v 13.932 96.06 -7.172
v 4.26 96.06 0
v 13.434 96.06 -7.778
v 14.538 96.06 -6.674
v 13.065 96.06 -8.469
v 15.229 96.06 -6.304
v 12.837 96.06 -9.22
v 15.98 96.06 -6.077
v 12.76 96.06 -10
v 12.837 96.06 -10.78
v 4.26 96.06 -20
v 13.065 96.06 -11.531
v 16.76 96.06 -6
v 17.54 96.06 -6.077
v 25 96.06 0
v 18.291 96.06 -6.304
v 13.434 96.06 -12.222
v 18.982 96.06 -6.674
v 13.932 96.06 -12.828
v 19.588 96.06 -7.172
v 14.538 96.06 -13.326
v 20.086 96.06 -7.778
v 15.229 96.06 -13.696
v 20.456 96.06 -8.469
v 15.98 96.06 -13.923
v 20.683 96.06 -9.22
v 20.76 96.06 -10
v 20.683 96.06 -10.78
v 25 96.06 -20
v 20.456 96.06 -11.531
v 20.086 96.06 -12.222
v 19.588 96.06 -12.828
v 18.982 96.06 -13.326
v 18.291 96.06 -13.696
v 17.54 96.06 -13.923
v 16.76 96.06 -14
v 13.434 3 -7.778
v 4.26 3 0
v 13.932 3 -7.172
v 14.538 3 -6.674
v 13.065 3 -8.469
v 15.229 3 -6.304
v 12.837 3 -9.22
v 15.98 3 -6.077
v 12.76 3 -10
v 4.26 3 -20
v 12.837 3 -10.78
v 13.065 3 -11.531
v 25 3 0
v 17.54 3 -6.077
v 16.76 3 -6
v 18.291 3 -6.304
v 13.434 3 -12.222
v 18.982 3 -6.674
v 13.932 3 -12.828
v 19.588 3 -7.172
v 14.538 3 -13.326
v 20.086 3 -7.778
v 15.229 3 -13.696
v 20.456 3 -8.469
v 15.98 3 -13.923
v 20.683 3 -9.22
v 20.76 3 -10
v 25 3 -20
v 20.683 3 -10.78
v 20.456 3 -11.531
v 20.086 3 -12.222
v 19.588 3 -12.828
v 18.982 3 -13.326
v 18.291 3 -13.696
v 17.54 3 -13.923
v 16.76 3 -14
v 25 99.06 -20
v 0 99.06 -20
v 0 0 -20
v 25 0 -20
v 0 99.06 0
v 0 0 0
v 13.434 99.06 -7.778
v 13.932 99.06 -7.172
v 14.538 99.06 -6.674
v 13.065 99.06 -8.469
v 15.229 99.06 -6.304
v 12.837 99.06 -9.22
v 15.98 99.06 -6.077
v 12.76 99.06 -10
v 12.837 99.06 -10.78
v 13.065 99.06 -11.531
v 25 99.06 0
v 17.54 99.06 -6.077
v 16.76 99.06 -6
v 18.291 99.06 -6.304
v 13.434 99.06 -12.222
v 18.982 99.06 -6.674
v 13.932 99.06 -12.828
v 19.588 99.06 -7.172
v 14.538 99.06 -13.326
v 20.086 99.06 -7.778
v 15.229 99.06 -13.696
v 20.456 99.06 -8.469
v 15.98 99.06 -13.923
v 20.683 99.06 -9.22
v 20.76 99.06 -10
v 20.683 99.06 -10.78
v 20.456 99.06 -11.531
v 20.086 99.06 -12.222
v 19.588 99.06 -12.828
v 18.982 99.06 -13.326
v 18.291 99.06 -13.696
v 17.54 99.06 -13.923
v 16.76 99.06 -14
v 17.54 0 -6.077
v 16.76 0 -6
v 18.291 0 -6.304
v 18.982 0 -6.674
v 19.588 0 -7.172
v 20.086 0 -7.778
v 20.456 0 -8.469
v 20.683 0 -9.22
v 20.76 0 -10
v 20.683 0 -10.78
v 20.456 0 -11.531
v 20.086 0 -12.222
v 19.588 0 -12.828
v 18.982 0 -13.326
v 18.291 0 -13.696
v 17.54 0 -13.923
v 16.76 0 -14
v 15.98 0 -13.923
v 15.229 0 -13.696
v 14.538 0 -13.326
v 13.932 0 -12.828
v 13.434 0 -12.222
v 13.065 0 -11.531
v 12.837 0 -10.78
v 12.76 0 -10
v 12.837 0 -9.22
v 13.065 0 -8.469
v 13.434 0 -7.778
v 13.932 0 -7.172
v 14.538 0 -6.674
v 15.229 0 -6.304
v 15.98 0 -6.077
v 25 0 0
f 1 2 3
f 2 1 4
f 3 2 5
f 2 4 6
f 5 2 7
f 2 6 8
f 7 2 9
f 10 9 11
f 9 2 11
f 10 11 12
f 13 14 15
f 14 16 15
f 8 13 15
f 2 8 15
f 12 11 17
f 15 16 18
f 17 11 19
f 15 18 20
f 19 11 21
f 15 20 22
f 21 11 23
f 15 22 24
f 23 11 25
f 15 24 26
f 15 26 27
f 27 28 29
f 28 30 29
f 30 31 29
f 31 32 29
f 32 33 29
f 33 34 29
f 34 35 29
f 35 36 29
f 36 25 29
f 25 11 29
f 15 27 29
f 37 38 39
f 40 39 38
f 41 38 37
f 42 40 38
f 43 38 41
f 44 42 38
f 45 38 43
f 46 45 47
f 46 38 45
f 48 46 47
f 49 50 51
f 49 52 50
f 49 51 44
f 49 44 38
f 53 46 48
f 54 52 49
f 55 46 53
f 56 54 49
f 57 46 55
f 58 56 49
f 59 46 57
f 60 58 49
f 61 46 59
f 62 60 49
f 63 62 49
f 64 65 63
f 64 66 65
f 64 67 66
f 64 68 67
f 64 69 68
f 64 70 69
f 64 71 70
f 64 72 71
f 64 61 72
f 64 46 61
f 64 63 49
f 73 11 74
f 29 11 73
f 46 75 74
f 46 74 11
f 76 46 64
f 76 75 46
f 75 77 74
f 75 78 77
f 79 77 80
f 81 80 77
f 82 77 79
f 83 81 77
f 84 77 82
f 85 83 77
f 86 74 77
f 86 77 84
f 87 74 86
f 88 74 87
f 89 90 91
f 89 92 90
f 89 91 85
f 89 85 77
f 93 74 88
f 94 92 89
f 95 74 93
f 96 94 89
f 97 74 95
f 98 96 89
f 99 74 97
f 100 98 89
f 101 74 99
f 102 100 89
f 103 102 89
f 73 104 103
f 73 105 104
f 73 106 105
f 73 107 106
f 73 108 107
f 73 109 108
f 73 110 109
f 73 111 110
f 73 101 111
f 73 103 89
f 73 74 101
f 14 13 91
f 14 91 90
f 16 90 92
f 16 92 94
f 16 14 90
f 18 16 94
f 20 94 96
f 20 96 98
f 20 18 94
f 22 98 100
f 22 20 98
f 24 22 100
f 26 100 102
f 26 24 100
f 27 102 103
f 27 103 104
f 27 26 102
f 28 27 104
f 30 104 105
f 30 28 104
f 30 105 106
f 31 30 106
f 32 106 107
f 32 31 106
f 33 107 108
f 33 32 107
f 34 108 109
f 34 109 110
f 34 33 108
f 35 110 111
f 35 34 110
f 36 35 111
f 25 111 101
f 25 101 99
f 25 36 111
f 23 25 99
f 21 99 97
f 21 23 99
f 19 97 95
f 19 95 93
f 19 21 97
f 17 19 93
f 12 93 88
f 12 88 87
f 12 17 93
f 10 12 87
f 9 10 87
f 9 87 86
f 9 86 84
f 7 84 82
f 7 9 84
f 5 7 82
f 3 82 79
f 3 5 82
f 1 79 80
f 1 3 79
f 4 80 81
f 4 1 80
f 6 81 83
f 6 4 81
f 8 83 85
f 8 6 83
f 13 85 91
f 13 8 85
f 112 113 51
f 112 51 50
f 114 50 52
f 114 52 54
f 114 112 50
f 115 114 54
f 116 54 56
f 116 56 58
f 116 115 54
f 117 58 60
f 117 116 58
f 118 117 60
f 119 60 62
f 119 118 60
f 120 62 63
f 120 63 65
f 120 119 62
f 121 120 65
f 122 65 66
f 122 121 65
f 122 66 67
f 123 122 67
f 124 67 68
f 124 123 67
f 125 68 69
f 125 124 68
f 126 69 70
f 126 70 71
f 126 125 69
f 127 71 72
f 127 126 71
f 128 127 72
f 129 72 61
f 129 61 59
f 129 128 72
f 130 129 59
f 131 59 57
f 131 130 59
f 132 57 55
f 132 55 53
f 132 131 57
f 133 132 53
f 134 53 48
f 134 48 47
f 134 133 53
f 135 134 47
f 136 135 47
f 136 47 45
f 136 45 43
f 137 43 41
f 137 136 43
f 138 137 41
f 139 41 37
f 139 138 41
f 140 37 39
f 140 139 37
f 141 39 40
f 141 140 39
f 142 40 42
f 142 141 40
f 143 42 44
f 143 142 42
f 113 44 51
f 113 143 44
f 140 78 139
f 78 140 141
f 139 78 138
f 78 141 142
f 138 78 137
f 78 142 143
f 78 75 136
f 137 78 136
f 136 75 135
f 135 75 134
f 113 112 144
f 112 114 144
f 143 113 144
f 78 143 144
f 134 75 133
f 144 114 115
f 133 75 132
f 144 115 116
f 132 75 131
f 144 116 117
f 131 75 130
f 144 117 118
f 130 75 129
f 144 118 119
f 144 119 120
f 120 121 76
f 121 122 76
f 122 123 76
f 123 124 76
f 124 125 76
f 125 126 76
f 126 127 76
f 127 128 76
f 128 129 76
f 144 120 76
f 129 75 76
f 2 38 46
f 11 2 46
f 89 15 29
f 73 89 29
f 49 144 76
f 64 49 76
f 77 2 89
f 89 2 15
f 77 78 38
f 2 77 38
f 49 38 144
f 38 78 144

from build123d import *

# Parameters (mm, degrees)
SKETCH1_W           = 25
SKETCH1_H           = 20
SKETCH1_R           = 4
BOSS_EXTRUDE1_DEPTH = 3
SKETCH2_W           = 4.260066628
SKETCH2_H           = 20
BOSS_EXTRUDE2_DEPTH = 93.06
SKETCH3_W           = 25
SKETCH3_H           = 20
SKETCH3_R           = 4
BOSS_EXTRUDE3_DEPTH = 3


with BuildPart() as part:
    # Sketch1 → Boss-Extrude1 (new body)
    with BuildSketch(Plane(origin=(0, 0, 0), x_dir=(1, 0, 0), z_dir=(0, 1, 0))):
        with Locations((12.5, 10)):
            Rectangle(SKETCH1_W, SKETCH1_H)
        with Locations(Location((16.760066628, 10, 0), (0, 0, 270))):
            Circle(SKETCH1_R, mode=Mode.SUBTRACT)
    extrude(amount=BOSS_EXTRUDE1_DEPTH)

    # Sketch2 → Boss-Extrude2 (add)
    with BuildSketch(Plane(origin=(0, 3, 0), x_dir=(1, 0, 0), z_dir=(0, 1, 0))):
        with Locations((2.130033314, 10)):
            Rectangle(SKETCH2_W, SKETCH2_H)
    extrude(amount=BOSS_EXTRUDE2_DEPTH)

    # Sketch3 → Boss-Extrude3 (add)
    with BuildSketch(Plane(origin=(0, 96.06, 0), x_dir=(1, 0, 0), z_dir=(0, 1, 0))):
        with Locations((12.5, 10)):
            Rectangle(SKETCH3_W, SKETCH3_H)
        with Locations(Location((16.760066628, 10, 0), (0, 0, 270))):
            Circle(SKETCH3_R, mode=Mode.SUBTRACT)
    extrude(amount=BOSS_EXTRUDE3_DEPTH)


solid = part.part
